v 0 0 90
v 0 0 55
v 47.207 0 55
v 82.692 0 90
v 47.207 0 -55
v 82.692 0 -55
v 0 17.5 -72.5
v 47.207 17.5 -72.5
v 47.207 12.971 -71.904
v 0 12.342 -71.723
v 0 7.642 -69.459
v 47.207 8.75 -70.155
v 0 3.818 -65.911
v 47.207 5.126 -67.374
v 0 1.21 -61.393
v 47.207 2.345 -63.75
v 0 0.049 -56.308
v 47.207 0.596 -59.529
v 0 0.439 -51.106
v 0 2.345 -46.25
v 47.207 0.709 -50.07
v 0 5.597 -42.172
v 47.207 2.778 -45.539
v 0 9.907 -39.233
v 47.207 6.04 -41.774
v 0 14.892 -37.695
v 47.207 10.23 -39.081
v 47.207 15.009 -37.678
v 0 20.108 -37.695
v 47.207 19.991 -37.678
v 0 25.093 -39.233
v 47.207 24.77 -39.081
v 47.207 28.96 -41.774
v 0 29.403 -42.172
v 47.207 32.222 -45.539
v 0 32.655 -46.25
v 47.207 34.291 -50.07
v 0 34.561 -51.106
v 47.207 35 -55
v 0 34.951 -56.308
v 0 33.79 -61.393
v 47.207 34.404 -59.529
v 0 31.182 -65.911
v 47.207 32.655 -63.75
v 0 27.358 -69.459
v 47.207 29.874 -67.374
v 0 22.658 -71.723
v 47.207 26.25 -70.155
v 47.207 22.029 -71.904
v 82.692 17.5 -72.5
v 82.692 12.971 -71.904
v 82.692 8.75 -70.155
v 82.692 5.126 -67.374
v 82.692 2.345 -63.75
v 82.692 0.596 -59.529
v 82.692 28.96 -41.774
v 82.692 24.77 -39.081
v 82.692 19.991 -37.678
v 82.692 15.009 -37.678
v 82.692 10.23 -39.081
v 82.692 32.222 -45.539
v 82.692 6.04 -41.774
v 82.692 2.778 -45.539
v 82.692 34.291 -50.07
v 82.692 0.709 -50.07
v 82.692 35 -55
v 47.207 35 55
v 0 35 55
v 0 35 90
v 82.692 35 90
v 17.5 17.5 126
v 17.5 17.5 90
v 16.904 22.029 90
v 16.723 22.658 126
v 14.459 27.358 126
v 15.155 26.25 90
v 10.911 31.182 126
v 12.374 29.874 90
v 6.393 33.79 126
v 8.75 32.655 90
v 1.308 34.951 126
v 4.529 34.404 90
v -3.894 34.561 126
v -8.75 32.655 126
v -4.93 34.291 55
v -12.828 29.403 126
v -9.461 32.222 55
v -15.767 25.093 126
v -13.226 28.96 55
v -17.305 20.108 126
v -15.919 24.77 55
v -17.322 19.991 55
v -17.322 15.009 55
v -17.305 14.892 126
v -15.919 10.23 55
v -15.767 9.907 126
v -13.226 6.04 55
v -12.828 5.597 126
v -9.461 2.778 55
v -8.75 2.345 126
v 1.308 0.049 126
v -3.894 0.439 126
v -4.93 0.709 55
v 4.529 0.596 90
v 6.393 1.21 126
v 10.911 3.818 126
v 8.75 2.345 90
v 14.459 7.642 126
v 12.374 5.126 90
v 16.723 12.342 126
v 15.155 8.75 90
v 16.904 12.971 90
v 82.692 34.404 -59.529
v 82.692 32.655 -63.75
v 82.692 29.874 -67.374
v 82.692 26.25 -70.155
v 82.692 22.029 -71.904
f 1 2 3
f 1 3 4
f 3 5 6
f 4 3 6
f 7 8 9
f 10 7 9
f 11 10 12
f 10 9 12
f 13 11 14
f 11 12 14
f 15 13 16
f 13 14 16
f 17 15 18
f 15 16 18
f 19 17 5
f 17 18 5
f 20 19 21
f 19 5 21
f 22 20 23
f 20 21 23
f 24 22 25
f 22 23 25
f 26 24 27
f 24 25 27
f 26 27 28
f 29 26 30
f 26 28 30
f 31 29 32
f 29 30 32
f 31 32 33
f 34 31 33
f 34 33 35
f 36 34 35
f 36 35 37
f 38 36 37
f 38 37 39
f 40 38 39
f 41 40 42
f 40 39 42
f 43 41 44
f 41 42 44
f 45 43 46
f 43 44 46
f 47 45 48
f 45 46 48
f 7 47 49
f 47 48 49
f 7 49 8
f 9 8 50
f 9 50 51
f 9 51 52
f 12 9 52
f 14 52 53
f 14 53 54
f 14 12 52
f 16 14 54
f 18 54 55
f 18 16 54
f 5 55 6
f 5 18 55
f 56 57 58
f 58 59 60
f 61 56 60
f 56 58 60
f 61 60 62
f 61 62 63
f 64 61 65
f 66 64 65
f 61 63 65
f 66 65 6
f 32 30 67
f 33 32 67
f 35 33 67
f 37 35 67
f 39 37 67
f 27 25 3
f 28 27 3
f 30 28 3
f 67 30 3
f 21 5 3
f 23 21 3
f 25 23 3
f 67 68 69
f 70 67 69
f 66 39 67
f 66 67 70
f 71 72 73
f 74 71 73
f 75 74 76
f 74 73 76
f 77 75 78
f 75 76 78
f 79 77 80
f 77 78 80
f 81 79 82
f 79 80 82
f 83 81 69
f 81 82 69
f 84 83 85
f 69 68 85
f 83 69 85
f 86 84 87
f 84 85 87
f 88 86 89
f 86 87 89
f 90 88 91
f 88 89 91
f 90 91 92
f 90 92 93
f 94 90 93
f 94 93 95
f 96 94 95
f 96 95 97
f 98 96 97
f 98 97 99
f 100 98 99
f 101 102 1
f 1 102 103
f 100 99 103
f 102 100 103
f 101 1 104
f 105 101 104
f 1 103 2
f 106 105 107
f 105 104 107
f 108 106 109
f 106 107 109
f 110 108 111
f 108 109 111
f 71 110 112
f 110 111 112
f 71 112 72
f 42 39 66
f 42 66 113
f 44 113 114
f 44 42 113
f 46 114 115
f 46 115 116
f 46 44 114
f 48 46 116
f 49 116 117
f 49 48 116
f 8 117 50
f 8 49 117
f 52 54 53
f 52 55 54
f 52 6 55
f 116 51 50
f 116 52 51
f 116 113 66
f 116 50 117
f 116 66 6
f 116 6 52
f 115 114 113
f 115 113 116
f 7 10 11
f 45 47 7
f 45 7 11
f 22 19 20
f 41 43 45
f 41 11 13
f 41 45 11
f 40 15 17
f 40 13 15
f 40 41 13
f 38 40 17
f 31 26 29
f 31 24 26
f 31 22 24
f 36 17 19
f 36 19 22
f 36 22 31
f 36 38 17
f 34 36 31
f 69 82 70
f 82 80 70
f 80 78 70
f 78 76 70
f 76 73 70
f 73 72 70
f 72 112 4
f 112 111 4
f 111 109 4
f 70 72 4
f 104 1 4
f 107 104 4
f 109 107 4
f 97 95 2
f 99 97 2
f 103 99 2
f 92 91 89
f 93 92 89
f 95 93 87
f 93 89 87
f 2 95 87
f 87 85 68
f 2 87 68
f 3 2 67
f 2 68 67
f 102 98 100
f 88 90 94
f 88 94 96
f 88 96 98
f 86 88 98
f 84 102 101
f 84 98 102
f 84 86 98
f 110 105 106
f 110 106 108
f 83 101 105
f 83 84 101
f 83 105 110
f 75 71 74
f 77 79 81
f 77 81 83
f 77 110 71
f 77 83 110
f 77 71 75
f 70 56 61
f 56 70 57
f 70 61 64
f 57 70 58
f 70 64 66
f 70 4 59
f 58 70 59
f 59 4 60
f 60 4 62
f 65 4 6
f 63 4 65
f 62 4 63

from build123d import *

# Parameters (mm, degrees)
BOSS_EXTRUDE1_DEPTH             = 35
BOSS_EXTRUDE4_REACH             = 109.487
SKETCH4_R                       = 17.5
BOSS_EXTRUDE4_DIRECTION_2_REACH = 109.487
BOSS_EXTRUDE3_DEPTH             = 36
BOSS_EXTRUDE3_DEPTH_BACK        = 35
SKETCH3_R                       = 17.5


with BuildPart() as part:
    # Sketch1 → Boss-Extrude1 (new body)
    with BuildSketch(Plane(origin=(0, 0, 0), x_dir=(1, 0, 0), z_dir=(0, 1, 0))):
        Polygon((0, -90), (82.692132723, -90), (82.692132723, 55), (47.206666819, 55), (47.206666819, -55), (0, -55), align=None)
    extrude(amount=BOSS_EXTRUDE1_DEPTH)


with BuildPart() as body_2:

    # Boss-Extrude4: up to this face of the body (flat: up to its plane)
    boss_extrude4_end = Plane(part.part.faces().sort_by_distance((0, 17.5, 72.5))[0])
    # Sketch4 → Boss-Extrude4 (new, up to the picked face)
    with BuildSketch(Plane.ZY.offset(-47.206666819), mode=Mode.PRIVATE) as boss_extrude4_sk1:
        with Locations(Location((-55, 17.5, 0), (0, 0, 180))):
            Circle(SKETCH4_R)
    boss_extrude4_tool1 = split(extrude(boss_extrude4_sk1.sketch, amount=BOSS_EXTRUDE4_REACH, mode=Mode.PRIVATE), bisect_by=boss_extrude4_end, keep=Keep.BOTH, mode=Mode.PRIVATE)
    add(boss_extrude4_tool1.solids().sort_by(Axis((47.206667, 17.5, -55), (-1, 0, 0)))[0])


    # Boss-Extrude4 direction 2: up to this face of the body (flat: up to its plane)
    boss_extrude4_direction_2_end = Plane(part.part.faces().sort_by_distance((82.692132723, 17.5, 17.5))[0])
    # Sketch4 → Boss-Extrude4 direction 2 (add, up to the picked face)
    with BuildSketch(Plane.ZY.offset(-47.206666819), mode=Mode.PRIVATE) as boss_extrude4_direction_2_sk1:
        with Locations(Location((-55, 17.5, 0), (0, 0, 180))):
            Circle(SKETCH4_R)
    boss_extrude4_direction_2_tool1 = split(extrude(boss_extrude4_direction_2_sk1.sketch, amount=-BOSS_EXTRUDE4_DIRECTION_2_REACH, mode=Mode.PRIVATE), bisect_by=boss_extrude4_direction_2_end, keep=Keep.BOTH, mode=Mode.PRIVATE)
    add(boss_extrude4_direction_2_tool1.solids().sort_by(Axis((47.206667, 17.5, -55), (1, 0, 0)))[0])


with BuildPart() as body_3:
    # Sketch3 → Boss-Extrude3 (new, two sides: drawn at the far end of the back side and taken through both)
    with BuildSketch(Plane.XY.offset(90).offset(-BOSS_EXTRUDE3_DEPTH_BACK)):
        with Locations((0, 17.5)):
            Circle(SKETCH3_R)
    extrude(amount=BOSS_EXTRUDE3_DEPTH + BOSS_EXTRUDE3_DEPTH_BACK)

    # Combine1: union part, body 2
    add(part.part)
    add(body_2.part)


solid = body_3.part
